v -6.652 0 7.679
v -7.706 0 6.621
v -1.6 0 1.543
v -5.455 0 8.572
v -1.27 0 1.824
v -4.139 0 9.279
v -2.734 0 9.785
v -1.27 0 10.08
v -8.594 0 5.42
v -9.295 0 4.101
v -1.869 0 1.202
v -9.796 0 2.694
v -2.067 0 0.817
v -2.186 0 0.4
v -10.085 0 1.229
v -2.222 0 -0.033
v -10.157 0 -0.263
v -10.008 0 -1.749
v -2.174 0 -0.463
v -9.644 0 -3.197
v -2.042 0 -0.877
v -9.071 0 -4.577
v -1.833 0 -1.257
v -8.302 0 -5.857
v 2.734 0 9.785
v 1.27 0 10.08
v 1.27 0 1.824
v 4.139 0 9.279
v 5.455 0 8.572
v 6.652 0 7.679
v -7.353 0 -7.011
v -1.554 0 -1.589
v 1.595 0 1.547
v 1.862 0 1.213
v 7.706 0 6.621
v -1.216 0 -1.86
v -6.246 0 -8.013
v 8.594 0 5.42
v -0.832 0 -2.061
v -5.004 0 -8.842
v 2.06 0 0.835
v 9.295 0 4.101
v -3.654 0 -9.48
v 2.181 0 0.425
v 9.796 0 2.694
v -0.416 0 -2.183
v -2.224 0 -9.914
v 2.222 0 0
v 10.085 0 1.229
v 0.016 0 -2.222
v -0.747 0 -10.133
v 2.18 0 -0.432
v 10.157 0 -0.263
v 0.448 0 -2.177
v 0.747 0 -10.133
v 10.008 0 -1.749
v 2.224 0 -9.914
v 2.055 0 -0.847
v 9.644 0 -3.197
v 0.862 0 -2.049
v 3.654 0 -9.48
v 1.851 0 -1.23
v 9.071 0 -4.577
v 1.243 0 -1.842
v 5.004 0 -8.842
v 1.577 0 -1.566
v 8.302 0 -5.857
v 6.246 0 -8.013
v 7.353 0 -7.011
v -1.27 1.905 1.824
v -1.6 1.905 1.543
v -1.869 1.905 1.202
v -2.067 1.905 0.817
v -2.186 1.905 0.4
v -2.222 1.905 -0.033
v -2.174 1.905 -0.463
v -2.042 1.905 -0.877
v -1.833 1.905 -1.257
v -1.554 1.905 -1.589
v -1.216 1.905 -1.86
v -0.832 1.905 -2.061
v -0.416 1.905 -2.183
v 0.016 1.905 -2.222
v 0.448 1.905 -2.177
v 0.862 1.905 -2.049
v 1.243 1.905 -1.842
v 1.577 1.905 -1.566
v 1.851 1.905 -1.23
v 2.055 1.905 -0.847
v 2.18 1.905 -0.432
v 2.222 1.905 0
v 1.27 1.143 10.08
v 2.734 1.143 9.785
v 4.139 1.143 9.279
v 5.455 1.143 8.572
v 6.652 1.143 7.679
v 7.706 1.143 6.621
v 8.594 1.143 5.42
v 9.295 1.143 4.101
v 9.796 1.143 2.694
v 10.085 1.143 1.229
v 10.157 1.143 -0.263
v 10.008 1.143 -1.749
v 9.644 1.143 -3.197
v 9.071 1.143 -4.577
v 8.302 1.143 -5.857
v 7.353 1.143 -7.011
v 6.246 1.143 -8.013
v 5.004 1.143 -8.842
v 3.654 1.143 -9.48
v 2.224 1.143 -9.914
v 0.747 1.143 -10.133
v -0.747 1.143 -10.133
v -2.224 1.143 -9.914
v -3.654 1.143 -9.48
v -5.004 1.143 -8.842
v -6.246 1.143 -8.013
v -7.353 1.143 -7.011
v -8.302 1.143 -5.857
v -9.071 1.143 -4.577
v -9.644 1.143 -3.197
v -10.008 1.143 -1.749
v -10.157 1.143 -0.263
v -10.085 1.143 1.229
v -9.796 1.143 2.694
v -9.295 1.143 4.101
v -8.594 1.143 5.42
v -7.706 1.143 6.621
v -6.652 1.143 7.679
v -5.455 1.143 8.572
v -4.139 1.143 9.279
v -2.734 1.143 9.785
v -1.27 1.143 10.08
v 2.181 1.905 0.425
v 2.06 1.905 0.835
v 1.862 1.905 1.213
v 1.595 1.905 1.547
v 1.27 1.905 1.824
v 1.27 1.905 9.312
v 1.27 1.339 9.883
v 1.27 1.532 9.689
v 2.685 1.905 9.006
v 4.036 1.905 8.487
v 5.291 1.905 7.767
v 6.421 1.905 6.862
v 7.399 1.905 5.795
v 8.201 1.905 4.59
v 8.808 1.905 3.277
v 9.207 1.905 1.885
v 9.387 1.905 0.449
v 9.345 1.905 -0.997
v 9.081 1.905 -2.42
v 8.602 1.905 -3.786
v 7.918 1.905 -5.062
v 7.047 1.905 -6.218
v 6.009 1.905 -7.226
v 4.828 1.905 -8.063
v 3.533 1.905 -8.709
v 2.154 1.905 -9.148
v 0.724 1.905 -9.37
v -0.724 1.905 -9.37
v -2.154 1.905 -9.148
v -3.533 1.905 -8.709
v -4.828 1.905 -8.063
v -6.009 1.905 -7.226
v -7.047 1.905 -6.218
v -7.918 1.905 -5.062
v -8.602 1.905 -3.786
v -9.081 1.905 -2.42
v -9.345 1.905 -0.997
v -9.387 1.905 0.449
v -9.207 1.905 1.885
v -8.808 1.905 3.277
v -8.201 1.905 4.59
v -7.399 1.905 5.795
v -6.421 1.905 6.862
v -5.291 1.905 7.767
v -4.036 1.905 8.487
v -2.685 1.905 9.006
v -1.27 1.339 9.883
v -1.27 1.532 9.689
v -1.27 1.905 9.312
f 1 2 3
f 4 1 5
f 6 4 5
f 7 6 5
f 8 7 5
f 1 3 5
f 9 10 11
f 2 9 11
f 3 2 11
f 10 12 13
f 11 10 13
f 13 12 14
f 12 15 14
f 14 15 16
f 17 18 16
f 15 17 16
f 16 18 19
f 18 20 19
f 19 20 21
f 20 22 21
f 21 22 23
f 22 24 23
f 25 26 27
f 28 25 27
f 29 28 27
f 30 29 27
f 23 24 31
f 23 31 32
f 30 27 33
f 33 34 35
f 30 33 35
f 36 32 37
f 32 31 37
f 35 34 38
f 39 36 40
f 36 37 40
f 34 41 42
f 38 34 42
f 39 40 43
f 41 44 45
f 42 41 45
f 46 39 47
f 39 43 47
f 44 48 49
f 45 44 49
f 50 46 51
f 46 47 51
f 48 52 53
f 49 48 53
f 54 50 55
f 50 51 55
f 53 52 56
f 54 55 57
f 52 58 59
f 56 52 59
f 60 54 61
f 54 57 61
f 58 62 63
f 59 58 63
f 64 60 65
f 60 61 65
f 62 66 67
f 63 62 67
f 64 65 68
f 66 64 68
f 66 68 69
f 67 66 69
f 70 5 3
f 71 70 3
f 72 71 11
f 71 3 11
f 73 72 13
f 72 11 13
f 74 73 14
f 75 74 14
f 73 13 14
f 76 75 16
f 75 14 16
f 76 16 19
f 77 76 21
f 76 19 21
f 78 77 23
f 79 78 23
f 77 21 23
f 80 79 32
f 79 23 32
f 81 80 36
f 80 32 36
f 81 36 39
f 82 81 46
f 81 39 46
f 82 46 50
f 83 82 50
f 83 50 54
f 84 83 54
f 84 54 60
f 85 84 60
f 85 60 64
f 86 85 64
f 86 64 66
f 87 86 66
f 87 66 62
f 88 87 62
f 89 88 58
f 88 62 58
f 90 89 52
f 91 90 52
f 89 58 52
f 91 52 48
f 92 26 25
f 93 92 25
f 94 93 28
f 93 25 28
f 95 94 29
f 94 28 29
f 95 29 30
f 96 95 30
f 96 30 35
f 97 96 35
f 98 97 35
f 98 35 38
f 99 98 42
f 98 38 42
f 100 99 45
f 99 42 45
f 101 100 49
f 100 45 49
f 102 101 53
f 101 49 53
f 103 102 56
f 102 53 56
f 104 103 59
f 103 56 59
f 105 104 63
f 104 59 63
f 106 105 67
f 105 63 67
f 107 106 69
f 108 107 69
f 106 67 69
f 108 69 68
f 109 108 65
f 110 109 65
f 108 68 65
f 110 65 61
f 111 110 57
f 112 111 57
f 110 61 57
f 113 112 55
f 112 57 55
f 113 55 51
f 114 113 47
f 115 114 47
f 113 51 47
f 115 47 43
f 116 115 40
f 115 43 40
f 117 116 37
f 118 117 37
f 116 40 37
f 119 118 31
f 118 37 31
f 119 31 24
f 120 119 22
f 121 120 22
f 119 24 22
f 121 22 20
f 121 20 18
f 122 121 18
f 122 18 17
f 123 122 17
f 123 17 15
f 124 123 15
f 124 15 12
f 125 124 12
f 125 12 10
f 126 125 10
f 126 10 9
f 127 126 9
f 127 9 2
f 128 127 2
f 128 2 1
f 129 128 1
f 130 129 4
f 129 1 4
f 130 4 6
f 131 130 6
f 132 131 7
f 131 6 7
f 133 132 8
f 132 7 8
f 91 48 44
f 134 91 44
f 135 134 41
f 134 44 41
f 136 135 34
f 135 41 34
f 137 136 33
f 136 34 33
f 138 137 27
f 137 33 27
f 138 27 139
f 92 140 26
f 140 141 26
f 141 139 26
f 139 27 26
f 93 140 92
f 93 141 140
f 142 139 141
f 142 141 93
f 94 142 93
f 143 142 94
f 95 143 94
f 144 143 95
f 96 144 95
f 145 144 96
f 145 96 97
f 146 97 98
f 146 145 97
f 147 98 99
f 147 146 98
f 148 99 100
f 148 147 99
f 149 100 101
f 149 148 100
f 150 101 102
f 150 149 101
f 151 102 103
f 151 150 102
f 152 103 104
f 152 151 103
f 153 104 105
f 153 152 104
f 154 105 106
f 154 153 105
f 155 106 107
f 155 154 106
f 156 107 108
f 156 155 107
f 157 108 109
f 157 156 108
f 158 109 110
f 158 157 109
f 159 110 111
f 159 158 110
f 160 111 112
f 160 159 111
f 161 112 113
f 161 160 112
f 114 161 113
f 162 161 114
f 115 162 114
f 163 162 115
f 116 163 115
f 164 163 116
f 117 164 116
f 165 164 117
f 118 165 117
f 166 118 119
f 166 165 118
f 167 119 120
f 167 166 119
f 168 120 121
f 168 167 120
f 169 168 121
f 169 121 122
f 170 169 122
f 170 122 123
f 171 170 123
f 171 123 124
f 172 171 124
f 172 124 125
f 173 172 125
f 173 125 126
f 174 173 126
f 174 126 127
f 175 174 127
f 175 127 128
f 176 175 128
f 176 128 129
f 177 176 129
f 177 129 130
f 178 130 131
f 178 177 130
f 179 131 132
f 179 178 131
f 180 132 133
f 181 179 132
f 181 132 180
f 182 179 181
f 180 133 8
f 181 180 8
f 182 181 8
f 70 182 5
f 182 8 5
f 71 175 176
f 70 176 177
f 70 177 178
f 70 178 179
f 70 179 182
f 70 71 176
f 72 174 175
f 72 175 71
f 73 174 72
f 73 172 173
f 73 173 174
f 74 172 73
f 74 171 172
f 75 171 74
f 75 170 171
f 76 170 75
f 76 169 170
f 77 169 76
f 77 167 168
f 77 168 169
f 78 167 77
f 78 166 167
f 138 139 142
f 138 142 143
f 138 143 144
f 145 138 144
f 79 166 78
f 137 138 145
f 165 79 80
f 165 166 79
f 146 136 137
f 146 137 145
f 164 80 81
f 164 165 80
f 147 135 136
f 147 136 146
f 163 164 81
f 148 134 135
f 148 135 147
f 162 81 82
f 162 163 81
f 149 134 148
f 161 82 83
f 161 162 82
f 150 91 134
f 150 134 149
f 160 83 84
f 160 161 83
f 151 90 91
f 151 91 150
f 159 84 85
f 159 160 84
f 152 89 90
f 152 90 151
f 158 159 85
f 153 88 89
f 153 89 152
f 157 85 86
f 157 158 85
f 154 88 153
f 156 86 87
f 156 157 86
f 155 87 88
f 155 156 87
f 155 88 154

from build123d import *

# Parameters (mm, degrees)
BOSS_EXTRUDE1_DEPTH = 1.905
CHAMFER1_SIZE       = 0.762


with BuildPart() as part:
    # Sketch1 → Boss-Extrude1 (new body)
    with BuildSketch(Plane(origin=(0, 0, 0), x_dir=(1, 0, 0), z_dir=(0, 1, 0))):
        with BuildLine():
            ThreePointArc((10.16, 0), (-6.72020833, 7.62), (-1.27, -10.080312495))
            Line((-1.27, -10.080312495), (-1.27, -1.82389864))
            ThreePointArc((-1.27, -1.82389864), (-1.028817586, 1.970035691), (2.2225, 0))
            ThreePointArc((2.2225, 0), (1.970035691, -1.028817586), (1.27, -1.82389864))
            Line((1.27, -1.82389864), (1.27, -10.080312495))
            ThreePointArc((1.27, -10.080312495), (7.62, -6.72020833), (10.16, 0))
        make_face()
    extrude(amount=BOSS_EXTRUDE1_DEPTH)

    # Chamfer1
    chamfer1_edges = [part.edges().sort_by_distance(p)[0] for p in [
        (0, 1.905, -10.16),
    ]]
    chamfer(chamfer1_edges, length=CHAMFER1_SIZE)


solid = part.part
